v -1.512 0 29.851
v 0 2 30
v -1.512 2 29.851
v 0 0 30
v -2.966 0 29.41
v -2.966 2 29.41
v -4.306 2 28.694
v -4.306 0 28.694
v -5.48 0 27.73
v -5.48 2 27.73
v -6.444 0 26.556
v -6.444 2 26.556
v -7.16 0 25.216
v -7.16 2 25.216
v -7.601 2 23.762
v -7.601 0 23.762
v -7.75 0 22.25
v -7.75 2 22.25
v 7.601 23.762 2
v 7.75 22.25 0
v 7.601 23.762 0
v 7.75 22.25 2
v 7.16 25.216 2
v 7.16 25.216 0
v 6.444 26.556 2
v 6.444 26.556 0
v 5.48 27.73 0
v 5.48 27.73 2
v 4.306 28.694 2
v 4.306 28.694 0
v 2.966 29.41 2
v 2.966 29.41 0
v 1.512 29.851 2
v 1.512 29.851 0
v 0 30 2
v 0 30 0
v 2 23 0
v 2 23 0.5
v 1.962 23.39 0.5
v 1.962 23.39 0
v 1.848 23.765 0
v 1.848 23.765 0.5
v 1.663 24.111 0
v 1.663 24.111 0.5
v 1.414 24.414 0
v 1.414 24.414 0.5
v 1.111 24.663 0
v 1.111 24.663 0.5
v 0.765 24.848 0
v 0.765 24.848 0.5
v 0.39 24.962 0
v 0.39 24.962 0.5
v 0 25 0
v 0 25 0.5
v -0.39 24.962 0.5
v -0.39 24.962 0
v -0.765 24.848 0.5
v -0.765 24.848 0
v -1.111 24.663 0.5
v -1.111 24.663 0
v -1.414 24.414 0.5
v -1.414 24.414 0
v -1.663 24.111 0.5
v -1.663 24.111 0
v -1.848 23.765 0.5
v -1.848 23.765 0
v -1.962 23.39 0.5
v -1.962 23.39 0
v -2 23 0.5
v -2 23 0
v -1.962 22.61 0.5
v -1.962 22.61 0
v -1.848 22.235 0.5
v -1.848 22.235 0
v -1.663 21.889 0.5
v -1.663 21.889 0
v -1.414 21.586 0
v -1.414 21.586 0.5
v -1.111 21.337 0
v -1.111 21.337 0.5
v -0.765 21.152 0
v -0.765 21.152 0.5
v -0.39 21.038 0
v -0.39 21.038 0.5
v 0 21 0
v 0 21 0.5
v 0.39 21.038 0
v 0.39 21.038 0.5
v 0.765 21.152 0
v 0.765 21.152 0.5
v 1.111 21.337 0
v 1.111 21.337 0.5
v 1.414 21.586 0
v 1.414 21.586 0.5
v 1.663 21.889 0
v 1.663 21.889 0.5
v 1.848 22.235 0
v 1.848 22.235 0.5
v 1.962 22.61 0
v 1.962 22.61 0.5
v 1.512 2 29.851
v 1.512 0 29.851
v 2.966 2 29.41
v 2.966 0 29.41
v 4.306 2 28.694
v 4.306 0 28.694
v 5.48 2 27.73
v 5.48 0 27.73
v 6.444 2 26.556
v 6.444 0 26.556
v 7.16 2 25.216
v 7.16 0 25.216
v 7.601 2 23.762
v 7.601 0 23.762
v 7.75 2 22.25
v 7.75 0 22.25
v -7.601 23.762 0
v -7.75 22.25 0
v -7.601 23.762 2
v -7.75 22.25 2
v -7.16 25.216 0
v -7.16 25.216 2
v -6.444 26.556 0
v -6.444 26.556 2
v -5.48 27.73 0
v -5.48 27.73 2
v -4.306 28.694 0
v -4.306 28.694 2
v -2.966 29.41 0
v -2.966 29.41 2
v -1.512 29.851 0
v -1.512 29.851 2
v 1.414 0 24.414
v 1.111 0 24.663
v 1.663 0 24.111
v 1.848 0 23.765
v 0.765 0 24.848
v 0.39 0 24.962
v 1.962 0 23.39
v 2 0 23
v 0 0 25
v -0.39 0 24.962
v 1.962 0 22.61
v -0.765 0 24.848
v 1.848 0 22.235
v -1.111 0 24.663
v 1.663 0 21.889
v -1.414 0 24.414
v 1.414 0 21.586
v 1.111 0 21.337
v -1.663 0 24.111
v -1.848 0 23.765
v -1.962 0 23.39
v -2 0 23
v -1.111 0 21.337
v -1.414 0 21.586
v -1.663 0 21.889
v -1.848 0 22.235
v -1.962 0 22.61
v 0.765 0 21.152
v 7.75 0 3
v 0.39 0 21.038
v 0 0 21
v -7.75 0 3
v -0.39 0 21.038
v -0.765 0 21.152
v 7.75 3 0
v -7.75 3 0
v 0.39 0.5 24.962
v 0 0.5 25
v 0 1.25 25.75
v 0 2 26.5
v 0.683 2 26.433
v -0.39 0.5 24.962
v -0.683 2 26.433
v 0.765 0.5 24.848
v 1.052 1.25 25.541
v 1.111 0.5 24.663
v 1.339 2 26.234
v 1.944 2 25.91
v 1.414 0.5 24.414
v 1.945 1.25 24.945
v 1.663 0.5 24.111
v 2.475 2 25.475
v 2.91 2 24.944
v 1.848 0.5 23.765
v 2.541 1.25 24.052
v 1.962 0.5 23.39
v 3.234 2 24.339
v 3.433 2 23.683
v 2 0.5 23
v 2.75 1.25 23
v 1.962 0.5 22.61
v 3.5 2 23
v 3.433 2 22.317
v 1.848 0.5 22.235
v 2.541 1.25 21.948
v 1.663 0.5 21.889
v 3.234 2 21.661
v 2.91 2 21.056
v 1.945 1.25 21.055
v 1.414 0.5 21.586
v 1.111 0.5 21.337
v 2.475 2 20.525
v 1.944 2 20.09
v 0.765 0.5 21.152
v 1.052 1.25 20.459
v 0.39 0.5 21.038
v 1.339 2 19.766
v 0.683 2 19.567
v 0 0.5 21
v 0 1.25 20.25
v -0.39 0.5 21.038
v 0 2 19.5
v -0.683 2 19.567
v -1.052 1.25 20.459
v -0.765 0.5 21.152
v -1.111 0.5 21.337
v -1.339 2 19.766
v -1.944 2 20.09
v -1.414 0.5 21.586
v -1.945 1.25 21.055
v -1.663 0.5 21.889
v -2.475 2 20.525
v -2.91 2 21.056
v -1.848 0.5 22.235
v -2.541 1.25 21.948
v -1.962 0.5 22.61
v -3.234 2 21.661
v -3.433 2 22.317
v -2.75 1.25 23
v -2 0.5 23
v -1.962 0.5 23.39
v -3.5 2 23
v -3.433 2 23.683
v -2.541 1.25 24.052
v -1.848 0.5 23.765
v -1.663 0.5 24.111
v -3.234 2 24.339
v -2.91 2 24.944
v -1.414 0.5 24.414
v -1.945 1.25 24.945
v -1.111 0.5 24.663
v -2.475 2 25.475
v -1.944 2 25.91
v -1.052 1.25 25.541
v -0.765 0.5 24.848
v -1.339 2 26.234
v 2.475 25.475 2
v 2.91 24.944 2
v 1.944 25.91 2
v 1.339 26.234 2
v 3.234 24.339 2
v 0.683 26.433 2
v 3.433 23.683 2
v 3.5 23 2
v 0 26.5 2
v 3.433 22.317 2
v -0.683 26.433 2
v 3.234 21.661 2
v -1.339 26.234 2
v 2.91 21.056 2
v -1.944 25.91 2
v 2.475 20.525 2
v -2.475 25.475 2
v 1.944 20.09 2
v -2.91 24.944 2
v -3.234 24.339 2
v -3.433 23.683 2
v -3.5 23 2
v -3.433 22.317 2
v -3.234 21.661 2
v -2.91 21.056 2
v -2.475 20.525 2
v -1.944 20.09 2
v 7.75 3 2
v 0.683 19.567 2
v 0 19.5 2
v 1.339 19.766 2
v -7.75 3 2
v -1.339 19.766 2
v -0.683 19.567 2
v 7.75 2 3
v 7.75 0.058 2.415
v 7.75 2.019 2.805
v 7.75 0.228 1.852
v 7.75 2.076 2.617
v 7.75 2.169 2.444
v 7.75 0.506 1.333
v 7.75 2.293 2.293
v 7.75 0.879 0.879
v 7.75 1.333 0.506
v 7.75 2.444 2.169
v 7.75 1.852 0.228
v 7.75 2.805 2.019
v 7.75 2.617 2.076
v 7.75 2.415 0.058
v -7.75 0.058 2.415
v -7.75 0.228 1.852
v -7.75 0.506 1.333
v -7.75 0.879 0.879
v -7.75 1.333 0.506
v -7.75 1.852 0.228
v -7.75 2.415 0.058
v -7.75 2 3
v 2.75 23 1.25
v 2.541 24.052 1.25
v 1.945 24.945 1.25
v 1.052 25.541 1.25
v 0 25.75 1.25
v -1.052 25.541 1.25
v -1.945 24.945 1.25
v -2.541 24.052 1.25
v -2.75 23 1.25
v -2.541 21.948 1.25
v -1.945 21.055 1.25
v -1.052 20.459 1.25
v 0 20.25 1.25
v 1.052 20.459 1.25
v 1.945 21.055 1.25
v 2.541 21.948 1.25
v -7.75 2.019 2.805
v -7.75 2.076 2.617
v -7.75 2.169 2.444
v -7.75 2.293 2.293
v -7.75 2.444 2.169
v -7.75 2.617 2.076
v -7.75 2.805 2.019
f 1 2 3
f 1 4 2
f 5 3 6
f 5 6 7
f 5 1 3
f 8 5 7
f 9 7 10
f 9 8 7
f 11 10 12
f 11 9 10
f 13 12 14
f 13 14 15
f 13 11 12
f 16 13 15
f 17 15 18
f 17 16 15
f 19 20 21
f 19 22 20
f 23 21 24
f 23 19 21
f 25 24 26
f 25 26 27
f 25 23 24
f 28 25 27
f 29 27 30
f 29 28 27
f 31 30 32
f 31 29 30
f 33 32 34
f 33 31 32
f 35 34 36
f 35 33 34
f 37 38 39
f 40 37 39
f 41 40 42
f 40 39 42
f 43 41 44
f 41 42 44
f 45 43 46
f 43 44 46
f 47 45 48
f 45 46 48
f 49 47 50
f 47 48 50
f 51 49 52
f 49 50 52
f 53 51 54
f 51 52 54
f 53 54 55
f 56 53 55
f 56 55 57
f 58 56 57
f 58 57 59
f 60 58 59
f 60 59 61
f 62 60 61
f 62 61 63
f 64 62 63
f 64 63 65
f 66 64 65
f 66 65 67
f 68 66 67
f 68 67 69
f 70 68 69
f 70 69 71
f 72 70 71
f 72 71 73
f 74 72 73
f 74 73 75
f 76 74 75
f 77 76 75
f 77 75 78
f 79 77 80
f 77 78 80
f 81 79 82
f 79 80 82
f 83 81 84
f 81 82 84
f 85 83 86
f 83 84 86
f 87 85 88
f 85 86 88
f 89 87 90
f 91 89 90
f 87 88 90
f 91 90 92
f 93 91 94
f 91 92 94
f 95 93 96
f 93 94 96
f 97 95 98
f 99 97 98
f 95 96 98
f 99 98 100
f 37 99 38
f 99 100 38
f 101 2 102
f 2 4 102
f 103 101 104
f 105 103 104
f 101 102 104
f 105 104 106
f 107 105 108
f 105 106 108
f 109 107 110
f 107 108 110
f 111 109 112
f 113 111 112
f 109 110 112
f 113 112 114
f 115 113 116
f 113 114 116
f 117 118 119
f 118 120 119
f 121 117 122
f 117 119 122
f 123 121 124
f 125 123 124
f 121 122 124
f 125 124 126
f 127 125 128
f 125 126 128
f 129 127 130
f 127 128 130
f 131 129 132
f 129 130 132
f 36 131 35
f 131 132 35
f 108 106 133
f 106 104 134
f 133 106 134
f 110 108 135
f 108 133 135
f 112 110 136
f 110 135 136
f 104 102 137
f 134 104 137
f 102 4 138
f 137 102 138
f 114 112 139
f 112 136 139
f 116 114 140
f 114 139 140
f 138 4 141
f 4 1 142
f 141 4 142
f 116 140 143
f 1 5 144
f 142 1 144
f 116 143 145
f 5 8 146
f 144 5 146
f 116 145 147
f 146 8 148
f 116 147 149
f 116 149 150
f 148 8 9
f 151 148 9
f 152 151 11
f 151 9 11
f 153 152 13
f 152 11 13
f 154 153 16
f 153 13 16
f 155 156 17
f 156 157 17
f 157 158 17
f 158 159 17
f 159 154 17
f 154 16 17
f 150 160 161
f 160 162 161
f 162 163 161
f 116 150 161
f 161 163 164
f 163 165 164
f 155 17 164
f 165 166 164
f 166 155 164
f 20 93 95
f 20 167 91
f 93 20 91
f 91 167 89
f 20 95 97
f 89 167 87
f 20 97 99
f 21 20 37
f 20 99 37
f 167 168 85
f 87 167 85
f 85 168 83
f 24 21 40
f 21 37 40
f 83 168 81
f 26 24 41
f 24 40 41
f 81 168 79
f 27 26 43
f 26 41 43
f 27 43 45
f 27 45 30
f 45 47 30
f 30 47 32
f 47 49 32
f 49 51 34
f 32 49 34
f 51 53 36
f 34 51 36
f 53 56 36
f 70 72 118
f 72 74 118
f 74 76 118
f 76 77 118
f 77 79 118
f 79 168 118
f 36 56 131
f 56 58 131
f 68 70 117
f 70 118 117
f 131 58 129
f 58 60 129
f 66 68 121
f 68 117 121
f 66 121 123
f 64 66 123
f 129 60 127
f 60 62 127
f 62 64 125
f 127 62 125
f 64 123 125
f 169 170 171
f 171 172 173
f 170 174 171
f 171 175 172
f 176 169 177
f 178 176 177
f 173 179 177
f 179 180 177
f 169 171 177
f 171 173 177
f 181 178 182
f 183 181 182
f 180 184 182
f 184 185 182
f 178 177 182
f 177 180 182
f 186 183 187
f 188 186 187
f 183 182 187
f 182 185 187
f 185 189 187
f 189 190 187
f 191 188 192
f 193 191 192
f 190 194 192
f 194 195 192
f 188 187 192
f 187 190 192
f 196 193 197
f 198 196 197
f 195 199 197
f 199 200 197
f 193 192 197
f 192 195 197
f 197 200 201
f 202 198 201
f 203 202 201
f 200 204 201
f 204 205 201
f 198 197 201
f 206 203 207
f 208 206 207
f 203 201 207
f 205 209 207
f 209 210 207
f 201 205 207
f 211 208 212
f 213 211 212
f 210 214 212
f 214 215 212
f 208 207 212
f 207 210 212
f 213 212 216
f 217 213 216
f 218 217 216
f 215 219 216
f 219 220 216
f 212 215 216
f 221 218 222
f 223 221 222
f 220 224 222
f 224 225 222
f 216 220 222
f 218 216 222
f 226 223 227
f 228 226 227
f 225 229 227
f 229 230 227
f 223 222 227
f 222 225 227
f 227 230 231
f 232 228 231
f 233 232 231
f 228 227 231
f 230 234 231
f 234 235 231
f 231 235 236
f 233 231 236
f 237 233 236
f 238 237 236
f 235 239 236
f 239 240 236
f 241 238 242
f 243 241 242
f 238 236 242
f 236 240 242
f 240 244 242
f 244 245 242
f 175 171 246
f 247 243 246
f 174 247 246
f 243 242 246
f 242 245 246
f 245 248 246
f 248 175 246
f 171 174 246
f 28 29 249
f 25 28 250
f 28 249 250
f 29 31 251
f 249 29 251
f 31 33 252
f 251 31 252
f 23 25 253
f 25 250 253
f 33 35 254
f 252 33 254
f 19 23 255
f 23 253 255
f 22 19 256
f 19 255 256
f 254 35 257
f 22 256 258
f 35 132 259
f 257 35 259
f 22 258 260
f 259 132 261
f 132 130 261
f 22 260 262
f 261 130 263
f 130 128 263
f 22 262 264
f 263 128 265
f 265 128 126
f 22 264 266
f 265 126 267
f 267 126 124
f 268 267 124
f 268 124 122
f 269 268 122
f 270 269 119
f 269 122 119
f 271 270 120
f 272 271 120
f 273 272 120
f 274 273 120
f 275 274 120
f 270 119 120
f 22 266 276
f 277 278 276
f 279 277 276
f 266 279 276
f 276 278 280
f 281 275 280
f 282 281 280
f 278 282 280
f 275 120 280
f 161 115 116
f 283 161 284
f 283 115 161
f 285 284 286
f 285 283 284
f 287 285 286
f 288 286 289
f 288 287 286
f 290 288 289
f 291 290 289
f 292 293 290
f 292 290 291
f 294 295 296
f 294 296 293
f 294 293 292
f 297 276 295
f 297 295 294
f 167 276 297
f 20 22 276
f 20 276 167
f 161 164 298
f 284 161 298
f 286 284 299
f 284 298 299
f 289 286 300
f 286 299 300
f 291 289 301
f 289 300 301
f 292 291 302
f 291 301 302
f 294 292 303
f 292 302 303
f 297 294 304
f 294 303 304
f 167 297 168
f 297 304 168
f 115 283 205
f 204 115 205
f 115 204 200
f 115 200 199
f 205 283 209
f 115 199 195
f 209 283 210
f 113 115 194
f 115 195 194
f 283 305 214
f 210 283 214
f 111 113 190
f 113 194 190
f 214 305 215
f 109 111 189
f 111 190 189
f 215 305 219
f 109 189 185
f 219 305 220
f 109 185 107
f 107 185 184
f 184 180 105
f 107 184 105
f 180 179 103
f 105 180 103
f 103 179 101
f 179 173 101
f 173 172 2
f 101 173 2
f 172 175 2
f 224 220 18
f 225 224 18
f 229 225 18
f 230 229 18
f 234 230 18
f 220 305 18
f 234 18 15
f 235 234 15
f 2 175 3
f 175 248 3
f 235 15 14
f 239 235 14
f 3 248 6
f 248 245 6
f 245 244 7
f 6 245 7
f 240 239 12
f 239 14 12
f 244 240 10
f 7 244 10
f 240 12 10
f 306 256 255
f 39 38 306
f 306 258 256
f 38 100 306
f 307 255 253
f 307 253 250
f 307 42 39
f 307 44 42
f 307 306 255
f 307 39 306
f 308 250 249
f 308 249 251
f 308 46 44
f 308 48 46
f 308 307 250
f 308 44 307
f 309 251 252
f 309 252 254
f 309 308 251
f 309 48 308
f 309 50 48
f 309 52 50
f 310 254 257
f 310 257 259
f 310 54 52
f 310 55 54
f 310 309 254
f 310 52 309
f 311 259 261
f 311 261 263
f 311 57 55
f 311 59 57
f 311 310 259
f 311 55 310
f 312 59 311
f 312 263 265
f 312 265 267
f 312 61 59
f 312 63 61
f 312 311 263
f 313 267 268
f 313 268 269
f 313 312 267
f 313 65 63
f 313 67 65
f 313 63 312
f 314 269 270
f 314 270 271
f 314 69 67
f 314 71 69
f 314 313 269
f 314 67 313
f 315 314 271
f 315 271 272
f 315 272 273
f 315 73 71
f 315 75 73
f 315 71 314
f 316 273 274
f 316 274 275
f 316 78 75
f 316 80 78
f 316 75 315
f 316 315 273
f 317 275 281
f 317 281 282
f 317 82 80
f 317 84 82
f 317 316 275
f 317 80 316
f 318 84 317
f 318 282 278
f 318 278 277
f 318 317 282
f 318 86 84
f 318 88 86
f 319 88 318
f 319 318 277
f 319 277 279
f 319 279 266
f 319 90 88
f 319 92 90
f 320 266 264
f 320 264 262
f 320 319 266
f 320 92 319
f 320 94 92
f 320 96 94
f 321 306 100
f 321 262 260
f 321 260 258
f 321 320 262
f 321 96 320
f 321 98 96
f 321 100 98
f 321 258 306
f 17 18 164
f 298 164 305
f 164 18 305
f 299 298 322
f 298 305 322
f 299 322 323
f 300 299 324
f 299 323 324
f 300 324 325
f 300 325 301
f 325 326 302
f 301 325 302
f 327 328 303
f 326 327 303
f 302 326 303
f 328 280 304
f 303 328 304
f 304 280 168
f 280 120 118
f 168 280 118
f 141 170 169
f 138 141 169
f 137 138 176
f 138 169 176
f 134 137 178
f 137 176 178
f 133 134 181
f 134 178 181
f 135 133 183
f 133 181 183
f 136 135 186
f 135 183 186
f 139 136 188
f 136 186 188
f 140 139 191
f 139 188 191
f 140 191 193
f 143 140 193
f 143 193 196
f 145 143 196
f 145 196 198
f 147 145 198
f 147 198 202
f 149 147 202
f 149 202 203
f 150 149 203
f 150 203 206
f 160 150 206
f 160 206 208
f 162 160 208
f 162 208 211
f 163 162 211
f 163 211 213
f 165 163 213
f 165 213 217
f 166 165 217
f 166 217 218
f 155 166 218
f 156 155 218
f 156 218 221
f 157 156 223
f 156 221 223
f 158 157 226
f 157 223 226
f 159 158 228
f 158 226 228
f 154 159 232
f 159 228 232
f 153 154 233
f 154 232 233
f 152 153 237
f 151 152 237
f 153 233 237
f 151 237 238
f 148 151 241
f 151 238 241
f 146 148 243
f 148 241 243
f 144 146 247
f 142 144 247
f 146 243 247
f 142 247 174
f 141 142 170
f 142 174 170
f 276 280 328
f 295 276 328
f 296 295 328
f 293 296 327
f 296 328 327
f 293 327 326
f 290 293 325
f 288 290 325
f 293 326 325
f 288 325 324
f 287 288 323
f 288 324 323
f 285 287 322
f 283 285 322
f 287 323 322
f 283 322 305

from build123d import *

# Parameters (mm, degrees)
EXTRUDE_1_DEPTH      = 7.75
EXTRUDE_1_DEPTH_BACK = 7.75
SKETCH_3_R           = 2
CUT_EXTRUDE_2_DEPTH  = 15.5
SKETCH_4_R           = 2
CUT_EXTRUDE_3_DEPTH  = 15.5
FILLET_1_R           = 7.75
CHAMFER_1_SIZE       = 1.5


with BuildPart() as part:
    # 草图1 → 凸台-拉伸1 (new, two sides: drawn at the far end of the back side and taken through both)
    with BuildSketch(Plane(origin=(0, 0, 0), x_dir=(0, 0, -1), z_dir=(1, 0, 0)).offset(-EXTRUDE_1_DEPTH_BACK)):
        with BuildLine():
            Line((-30, 0), (-3, 0))
            ThreePointArc((-3, 0), (-0.878679656, 0.878679656), (0, 3))
            Line((0, 3), (0, 30))
            Line((0, 30), (-2, 30))
            Line((-2, 30), (-2, 3))
            ThreePointArc((-2, 3), (-2.292893219, 2.292893219), (-3, 2))
            Line((-3, 2), (-30, 2))
            Line((-30, 2), (-30, 0))
        make_face()
    extrude(amount=EXTRUDE_1_DEPTH + EXTRUDE_1_DEPTH_BACK)

    # 草图3 → 切除-拉伸2 (cut)
    with BuildSketch(Plane(origin=(0, 2, 0), x_dir=(1, 0, 0), z_dir=(0, 1, 0))):
        with Locations(Location((0, -23, 0), (0, 0, 270))):
            Circle(SKETCH_3_R)
    extrude(amount=-CUT_EXTRUDE_2_DEPTH, mode=Mode.SUBTRACT)

    # 草图4 → 切除-拉伸3 (cut)
    with BuildSketch(Plane.XY.offset(2)):
        with Locations((0, 23)):
            Circle(SKETCH_4_R)
    extrude(amount=-CUT_EXTRUDE_3_DEPTH, mode=Mode.SUBTRACT)

    # 圆角1
    fillet_1_edges = [part.edges().sort_by_distance(p)[0] for p in [
        (7.75, 30, 1),
        (-7.75, 30, 1),
        (7.75, 1, 30),
        (-7.75, 1, 30),
    ]]
    fillet(fillet_1_edges, radius=FILLET_1_R - 0.0001)  # a hair under: the kernel refuses the full size

    # 倒角1
    chamfer_1_edges = [part.edges().sort_by_distance(p)[0] for p in [
        (0, 2, 21),
        (-2, 23, 2),
    ]]
    chamfer(chamfer_1_edges, length=CHAMFER_1_SIZE)


solid = part.part
